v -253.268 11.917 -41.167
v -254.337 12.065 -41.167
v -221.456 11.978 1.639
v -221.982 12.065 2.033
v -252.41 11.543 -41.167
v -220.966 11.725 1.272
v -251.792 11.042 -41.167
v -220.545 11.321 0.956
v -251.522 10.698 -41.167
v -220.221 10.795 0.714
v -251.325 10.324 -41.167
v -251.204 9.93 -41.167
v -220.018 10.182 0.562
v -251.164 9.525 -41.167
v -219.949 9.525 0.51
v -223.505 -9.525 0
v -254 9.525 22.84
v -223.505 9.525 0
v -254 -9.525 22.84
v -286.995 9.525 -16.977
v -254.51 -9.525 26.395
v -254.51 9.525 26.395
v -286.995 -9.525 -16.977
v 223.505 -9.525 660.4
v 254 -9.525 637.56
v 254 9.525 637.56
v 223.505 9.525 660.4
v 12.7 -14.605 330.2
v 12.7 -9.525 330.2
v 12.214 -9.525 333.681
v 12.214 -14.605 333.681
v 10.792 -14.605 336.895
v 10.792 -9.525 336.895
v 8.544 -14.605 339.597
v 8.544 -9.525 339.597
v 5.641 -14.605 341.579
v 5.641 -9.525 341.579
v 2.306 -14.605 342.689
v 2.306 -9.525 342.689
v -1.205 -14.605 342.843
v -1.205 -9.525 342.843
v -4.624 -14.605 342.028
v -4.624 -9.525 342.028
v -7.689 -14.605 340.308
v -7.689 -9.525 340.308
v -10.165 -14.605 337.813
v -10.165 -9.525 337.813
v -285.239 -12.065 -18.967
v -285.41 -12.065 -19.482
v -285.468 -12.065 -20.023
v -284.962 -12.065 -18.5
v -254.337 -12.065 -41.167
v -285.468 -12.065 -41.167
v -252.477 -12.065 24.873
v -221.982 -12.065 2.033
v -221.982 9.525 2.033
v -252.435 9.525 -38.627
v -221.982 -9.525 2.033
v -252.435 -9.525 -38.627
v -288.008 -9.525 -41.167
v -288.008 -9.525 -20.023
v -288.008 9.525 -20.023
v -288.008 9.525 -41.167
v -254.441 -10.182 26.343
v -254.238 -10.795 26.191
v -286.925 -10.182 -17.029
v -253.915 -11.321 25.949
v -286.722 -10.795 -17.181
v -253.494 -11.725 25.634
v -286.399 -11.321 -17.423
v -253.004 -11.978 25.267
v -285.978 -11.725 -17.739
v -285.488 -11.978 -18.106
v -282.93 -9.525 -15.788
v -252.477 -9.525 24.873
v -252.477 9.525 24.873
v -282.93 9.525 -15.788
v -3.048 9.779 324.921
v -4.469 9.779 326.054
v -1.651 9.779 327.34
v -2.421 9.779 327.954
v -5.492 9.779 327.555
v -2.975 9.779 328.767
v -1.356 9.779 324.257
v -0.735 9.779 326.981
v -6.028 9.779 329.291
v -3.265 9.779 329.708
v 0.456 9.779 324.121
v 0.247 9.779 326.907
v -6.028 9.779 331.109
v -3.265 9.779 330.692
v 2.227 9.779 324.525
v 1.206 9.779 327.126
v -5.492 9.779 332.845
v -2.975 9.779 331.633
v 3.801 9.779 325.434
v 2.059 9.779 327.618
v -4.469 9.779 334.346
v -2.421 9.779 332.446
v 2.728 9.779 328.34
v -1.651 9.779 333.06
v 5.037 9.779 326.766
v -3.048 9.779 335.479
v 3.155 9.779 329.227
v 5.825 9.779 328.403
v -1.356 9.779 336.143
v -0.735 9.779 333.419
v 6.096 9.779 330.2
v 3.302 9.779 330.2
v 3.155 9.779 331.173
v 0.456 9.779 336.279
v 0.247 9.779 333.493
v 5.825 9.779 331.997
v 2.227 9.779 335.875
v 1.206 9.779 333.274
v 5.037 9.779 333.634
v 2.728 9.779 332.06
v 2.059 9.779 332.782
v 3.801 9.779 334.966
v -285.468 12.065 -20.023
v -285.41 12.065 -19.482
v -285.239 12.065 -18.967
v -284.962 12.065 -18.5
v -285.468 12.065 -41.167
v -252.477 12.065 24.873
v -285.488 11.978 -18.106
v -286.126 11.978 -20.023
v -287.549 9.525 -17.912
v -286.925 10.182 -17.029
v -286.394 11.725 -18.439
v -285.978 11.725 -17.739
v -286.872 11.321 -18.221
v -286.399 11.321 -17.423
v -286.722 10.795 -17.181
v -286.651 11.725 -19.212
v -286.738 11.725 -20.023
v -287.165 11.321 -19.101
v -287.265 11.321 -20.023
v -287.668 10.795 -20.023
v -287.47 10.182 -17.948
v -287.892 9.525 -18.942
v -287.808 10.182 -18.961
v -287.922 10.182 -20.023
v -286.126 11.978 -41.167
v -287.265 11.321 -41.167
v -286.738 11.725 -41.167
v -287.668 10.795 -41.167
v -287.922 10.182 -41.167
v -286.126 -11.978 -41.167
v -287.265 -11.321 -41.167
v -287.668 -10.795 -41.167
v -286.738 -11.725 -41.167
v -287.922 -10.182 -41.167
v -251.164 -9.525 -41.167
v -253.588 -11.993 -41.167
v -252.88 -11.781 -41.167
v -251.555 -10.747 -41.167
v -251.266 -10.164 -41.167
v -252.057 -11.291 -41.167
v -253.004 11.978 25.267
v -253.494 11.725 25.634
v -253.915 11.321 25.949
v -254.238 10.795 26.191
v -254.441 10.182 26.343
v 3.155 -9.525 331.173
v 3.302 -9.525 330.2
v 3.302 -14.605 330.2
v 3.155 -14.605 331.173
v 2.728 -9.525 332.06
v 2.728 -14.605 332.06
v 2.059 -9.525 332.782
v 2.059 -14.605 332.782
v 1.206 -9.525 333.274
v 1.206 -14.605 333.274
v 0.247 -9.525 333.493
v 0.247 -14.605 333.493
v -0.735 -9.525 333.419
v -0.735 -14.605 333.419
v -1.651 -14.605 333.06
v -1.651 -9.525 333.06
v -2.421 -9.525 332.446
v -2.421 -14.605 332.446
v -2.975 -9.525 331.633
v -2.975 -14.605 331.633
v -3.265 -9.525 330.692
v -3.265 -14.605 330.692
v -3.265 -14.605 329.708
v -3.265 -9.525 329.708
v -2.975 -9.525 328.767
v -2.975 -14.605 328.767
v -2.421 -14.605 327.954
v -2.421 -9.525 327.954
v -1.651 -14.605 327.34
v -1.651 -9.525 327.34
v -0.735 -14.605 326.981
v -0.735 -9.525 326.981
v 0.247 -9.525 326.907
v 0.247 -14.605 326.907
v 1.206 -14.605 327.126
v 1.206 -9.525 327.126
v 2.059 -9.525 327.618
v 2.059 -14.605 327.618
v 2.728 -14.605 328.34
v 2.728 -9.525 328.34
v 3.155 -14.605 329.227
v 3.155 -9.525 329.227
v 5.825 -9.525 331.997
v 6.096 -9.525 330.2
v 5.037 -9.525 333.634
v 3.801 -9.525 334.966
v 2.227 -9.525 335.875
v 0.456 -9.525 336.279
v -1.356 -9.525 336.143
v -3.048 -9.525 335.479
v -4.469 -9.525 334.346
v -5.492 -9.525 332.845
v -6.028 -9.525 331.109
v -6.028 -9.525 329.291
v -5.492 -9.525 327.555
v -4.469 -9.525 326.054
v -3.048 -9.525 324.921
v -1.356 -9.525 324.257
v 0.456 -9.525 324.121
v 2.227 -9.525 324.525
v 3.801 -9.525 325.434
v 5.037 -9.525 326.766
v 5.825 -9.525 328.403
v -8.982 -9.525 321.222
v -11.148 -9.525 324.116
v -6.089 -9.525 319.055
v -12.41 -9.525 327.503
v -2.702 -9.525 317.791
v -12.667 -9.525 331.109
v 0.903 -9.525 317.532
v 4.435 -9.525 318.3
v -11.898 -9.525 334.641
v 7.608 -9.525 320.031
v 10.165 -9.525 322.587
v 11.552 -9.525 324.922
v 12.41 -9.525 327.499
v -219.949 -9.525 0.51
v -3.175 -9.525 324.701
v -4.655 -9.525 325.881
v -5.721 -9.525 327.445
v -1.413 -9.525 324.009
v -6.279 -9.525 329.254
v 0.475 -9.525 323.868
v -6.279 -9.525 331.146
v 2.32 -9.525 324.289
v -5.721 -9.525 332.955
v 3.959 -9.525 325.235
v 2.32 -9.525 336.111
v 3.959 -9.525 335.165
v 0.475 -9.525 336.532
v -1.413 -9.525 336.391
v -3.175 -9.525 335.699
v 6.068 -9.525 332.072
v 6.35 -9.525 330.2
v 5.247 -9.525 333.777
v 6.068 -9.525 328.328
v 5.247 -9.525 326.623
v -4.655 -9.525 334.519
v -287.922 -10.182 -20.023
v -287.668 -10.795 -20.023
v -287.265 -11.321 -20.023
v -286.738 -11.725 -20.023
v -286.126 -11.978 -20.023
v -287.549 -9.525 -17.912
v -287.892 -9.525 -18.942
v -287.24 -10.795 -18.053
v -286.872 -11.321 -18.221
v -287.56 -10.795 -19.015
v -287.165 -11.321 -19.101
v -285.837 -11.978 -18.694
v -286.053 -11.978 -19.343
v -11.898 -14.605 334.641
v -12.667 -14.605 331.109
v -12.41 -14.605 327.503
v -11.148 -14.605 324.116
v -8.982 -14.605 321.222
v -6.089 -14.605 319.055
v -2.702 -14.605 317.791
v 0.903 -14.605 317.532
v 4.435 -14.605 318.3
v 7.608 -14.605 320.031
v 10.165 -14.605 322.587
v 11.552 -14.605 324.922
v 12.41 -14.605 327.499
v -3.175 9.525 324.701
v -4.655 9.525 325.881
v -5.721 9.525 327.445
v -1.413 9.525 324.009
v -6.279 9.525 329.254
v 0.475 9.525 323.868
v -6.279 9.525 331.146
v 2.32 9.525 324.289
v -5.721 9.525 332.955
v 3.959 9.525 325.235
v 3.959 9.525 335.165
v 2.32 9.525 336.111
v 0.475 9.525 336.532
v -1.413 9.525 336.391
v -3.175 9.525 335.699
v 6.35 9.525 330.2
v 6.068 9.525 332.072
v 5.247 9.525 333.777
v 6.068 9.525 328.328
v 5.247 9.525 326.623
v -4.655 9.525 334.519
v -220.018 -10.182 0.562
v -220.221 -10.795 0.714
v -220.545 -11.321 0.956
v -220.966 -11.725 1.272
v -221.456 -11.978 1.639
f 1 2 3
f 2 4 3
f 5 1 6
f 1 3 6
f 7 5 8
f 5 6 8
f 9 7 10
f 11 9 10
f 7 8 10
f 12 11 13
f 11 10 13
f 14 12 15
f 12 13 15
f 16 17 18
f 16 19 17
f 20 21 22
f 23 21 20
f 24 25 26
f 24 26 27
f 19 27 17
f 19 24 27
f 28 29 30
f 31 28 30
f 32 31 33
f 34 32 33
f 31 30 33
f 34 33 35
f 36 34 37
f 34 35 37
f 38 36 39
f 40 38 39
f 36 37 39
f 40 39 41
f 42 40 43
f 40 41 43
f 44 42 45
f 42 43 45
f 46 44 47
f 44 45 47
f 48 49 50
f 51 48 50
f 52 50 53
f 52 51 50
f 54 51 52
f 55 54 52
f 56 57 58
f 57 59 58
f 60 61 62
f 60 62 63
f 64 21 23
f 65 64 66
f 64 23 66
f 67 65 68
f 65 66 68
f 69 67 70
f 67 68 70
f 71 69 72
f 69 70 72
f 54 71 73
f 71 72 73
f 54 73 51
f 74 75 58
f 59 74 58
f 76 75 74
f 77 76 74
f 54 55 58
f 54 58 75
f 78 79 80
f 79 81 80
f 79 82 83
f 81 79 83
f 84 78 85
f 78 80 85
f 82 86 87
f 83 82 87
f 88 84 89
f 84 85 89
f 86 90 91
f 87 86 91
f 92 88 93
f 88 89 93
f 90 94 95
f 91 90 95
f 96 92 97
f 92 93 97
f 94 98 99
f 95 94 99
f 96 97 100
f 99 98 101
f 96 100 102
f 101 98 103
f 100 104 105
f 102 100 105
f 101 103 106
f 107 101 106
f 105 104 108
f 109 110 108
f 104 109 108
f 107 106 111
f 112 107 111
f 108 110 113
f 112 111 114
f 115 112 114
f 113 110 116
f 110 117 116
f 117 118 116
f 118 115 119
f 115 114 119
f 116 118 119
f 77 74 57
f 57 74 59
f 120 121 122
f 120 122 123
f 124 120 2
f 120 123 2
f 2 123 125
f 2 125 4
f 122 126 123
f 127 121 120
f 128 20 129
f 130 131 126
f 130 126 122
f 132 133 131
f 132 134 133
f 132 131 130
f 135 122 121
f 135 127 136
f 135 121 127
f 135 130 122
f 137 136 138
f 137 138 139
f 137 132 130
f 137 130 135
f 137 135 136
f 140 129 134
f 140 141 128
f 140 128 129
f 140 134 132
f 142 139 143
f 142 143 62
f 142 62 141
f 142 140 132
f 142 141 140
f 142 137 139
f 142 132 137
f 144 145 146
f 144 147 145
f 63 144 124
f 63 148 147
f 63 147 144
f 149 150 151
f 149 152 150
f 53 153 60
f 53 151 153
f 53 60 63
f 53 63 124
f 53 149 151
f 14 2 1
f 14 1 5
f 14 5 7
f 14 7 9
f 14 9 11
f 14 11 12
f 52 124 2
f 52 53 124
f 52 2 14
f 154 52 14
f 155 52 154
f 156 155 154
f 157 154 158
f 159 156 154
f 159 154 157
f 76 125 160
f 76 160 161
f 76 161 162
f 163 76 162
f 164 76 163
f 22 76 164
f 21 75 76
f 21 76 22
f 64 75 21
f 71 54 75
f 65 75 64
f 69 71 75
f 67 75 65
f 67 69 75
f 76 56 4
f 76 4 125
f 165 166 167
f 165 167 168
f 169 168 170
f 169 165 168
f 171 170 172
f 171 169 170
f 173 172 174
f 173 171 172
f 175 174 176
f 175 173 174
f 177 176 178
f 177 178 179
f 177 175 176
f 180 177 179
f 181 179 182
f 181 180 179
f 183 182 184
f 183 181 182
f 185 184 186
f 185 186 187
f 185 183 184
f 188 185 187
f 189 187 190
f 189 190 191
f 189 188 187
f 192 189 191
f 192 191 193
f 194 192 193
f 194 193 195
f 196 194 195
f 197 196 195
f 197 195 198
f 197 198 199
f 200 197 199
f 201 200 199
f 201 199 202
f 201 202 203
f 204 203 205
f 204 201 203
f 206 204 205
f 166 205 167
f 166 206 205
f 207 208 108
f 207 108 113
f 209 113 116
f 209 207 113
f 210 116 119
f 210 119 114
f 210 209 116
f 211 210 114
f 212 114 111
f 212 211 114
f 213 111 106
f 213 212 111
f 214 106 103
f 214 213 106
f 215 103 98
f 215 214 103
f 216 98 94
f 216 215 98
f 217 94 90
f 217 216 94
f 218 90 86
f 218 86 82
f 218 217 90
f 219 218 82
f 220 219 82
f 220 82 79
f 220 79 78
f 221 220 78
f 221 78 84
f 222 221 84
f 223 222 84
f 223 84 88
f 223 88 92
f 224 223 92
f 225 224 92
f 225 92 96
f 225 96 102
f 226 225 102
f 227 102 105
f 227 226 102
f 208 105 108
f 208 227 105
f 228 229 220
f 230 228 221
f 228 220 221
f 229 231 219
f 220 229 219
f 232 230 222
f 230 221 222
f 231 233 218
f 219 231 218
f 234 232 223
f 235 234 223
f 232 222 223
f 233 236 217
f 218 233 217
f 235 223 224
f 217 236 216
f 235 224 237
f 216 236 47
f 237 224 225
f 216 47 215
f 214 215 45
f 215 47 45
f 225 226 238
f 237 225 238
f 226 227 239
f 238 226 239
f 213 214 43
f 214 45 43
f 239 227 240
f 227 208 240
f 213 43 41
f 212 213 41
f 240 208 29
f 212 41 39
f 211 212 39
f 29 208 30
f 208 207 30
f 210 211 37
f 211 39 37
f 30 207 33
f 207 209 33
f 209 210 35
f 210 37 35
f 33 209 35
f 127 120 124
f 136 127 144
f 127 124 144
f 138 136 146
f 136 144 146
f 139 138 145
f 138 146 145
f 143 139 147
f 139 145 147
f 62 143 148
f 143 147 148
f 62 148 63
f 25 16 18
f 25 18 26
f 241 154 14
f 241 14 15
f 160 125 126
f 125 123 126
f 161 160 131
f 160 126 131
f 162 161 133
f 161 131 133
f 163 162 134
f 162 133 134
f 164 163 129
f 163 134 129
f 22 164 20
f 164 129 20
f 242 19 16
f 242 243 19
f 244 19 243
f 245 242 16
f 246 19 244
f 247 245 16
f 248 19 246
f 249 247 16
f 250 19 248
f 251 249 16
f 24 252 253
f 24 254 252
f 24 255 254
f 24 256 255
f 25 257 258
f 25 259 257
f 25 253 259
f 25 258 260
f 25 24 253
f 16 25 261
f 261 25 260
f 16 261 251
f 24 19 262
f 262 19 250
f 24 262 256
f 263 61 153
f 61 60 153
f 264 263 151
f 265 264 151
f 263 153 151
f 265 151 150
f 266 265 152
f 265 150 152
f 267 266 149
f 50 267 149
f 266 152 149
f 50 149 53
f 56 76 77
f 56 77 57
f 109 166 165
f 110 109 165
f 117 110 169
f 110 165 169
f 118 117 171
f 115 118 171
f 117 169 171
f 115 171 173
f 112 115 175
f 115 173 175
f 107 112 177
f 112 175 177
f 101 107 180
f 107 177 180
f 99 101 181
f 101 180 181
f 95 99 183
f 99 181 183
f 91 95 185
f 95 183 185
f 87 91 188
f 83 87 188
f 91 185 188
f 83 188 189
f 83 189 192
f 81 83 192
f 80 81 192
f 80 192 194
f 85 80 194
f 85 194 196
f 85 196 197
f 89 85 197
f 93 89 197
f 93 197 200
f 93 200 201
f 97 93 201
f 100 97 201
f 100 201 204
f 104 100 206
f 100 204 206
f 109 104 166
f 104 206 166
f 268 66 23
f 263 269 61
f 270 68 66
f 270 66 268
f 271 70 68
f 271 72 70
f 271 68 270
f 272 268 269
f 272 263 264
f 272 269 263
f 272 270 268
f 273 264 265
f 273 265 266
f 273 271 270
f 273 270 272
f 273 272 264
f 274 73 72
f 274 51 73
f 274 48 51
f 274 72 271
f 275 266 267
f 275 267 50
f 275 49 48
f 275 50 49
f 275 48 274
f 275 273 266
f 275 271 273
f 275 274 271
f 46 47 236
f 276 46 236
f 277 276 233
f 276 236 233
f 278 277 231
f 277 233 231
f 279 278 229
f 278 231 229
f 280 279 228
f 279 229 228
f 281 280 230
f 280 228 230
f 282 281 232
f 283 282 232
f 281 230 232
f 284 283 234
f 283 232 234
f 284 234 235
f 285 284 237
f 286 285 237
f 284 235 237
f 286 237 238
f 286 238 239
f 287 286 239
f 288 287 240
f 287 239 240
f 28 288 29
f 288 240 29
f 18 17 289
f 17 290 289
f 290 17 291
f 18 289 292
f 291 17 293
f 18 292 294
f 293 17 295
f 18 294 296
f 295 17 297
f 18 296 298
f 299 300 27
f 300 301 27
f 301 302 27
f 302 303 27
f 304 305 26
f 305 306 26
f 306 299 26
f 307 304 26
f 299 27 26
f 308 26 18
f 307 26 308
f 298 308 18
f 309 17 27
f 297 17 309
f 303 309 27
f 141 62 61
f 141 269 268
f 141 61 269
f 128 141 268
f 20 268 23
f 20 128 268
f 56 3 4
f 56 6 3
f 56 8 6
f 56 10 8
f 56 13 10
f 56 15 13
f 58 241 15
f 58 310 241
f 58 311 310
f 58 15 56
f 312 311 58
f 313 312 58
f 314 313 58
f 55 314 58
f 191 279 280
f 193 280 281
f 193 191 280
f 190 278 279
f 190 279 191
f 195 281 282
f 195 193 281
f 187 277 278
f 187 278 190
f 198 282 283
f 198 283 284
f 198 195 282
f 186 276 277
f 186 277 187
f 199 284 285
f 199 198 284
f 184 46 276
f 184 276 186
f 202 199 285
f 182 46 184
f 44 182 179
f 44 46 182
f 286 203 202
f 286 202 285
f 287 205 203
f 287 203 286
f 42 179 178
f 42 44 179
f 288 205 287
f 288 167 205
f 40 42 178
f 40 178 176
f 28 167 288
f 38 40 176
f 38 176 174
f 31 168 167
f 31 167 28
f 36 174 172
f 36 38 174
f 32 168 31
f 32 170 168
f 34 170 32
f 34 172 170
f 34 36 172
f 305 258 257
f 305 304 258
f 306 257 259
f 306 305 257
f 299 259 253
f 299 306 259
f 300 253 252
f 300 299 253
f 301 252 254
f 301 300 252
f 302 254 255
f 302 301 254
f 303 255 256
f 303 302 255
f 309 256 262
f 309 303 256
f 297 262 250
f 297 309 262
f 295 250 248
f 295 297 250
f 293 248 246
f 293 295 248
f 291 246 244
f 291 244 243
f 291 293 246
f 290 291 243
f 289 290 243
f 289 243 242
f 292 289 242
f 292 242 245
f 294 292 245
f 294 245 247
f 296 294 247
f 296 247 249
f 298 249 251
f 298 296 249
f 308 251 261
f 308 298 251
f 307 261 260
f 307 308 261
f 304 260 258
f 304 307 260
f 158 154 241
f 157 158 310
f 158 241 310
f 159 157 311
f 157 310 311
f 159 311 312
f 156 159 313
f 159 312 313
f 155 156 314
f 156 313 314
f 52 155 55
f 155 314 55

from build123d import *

# Parameters (mm, degrees)
F0_R     = 6.35
F2_DEPTH = 9.525
F3_DEPTH = 12.065
F4_DEPTH = 9.525
F5_R     = 6.35
F5_R_2   = 6.096
F5_R_3   = 3.302
F6_DEPTH = 5.08
F7_DEPTH = 19.304
F8_R     = 5.08
F9_R     = 2.54


with BuildPart() as f2:
    # F0 (on Front) → F2 (new body, symmetric)
    with BuildSketch(Plane.XZ):
        Polygon((-254, 22.8396208531), (-223.5047262796, 0), (254, 637.5603791469), (223.5047262796, 660.4), align=None)
        with Locations((0, 330.2)):
            Circle(F0_R, mode=Mode.SUBTRACT)
    extrude(amount=F2_DEPTH, both=True)


with BuildPart() as f3:
    # F1 (on Front) → F3 (new body, symmetric)
    with BuildSketch(Plane.XZ):
        Polygon((-288.0084874424, -41.1673467126), (-251.1638513682, -41.1673467126), (-219.9490666413, 0.5103768578), (-221.9820848893, 2.033018248), (-252.4349126935, -38.6273467126), (-282.930186414, -15.7877258594), (-252.4773586098, 24.8726391012), (-254.5103768578, 26.3952804914), (-288.0084874424, -18.3311209653), align=None)
        Polygon((-252.4349126935, -38.6273467126), (-221.9820848893, 2.033018248), (-252.4773586098, 24.8726391012), (-282.930186414, -15.7877258594), align=None)
    extrude(amount=F3_DEPTH, both=True)

    # F1 (on Front) → F4 (cut, symmetric)
    with BuildSketch(Plane.XZ):
        Polygon((-252.4349126935, -38.6273467126), (-221.9820848893, 2.033018248), (-252.4773586098, 24.8726391012), (-282.930186414, -15.7877258594), align=None)
    extrude(amount=F4_DEPTH, both=True, mode=Mode.SUBTRACT)

    # F8
    f8_edges = [f3.edges().sort_by_distance(p)[0] for p in [
        (-288.008487, 0, -18.331121),
    ]]
    fillet(f8_edges, radius=F8_R)

    # F9
    f9_edges = [f3.edges().sort_by_distance(p)[0] for p in [
        (-270.75245, -12.065, 4.708998),
        (-235.556459, -12.065, -20.328485),
        (-235.556459, 12.065, -20.328485),
        (-270.75245, 12.065, 4.708998),
    ]]
    fillet(f9_edges, radius=F9_R)


with BuildPart() as f6:
    # F5 (on face) → F6 (new body)
    with BuildSketch(Plane.XZ.offset(9.525)):
        with BuildLine():
            ThreePointArc((12.7, 330.2), (4.0120660301, 342.2496193372), (-10.1650907355, 337.8132076249))
            ThreePointArc((-10.1650907355, 337.8132076249), (-7.613207358, 320.0349090647), (10.1650911352, 322.5867929088))
            ThreePointArc((10.1650911352, 322.5867929088), (12.0496194425, 326.1879342862), (12.7, 330.2))
        make_face()
        with Locations((0, 330.2)):
            Circle(F5_R, mode=Mode.SUBTRACT)
        with Locations((0, 330.2)):
            Circle(F5_R)
        with Locations((0, 330.2)):
            Circle(F5_R_2, mode=Mode.SUBTRACT)
        with Locations((0, 330.2)):
            Circle(F5_R_2)
        with Locations((0, 330.2)):
            Circle(F5_R_3, mode=Mode.SUBTRACT)
    extrude(amount=F6_DEPTH)

    # F5 (on face) → F7 (join)
    with BuildSketch(Plane.XZ.offset(9.525)):
        with Locations((0, 330.2)):
            Circle(F5_R_2)
        with Locations((0, 330.2)):
            Circle(F5_R_3, mode=Mode.SUBTRACT)
    extrude(amount=-F7_DEPTH)


solid = Compound([f2.part, f3.part, f6.part])
